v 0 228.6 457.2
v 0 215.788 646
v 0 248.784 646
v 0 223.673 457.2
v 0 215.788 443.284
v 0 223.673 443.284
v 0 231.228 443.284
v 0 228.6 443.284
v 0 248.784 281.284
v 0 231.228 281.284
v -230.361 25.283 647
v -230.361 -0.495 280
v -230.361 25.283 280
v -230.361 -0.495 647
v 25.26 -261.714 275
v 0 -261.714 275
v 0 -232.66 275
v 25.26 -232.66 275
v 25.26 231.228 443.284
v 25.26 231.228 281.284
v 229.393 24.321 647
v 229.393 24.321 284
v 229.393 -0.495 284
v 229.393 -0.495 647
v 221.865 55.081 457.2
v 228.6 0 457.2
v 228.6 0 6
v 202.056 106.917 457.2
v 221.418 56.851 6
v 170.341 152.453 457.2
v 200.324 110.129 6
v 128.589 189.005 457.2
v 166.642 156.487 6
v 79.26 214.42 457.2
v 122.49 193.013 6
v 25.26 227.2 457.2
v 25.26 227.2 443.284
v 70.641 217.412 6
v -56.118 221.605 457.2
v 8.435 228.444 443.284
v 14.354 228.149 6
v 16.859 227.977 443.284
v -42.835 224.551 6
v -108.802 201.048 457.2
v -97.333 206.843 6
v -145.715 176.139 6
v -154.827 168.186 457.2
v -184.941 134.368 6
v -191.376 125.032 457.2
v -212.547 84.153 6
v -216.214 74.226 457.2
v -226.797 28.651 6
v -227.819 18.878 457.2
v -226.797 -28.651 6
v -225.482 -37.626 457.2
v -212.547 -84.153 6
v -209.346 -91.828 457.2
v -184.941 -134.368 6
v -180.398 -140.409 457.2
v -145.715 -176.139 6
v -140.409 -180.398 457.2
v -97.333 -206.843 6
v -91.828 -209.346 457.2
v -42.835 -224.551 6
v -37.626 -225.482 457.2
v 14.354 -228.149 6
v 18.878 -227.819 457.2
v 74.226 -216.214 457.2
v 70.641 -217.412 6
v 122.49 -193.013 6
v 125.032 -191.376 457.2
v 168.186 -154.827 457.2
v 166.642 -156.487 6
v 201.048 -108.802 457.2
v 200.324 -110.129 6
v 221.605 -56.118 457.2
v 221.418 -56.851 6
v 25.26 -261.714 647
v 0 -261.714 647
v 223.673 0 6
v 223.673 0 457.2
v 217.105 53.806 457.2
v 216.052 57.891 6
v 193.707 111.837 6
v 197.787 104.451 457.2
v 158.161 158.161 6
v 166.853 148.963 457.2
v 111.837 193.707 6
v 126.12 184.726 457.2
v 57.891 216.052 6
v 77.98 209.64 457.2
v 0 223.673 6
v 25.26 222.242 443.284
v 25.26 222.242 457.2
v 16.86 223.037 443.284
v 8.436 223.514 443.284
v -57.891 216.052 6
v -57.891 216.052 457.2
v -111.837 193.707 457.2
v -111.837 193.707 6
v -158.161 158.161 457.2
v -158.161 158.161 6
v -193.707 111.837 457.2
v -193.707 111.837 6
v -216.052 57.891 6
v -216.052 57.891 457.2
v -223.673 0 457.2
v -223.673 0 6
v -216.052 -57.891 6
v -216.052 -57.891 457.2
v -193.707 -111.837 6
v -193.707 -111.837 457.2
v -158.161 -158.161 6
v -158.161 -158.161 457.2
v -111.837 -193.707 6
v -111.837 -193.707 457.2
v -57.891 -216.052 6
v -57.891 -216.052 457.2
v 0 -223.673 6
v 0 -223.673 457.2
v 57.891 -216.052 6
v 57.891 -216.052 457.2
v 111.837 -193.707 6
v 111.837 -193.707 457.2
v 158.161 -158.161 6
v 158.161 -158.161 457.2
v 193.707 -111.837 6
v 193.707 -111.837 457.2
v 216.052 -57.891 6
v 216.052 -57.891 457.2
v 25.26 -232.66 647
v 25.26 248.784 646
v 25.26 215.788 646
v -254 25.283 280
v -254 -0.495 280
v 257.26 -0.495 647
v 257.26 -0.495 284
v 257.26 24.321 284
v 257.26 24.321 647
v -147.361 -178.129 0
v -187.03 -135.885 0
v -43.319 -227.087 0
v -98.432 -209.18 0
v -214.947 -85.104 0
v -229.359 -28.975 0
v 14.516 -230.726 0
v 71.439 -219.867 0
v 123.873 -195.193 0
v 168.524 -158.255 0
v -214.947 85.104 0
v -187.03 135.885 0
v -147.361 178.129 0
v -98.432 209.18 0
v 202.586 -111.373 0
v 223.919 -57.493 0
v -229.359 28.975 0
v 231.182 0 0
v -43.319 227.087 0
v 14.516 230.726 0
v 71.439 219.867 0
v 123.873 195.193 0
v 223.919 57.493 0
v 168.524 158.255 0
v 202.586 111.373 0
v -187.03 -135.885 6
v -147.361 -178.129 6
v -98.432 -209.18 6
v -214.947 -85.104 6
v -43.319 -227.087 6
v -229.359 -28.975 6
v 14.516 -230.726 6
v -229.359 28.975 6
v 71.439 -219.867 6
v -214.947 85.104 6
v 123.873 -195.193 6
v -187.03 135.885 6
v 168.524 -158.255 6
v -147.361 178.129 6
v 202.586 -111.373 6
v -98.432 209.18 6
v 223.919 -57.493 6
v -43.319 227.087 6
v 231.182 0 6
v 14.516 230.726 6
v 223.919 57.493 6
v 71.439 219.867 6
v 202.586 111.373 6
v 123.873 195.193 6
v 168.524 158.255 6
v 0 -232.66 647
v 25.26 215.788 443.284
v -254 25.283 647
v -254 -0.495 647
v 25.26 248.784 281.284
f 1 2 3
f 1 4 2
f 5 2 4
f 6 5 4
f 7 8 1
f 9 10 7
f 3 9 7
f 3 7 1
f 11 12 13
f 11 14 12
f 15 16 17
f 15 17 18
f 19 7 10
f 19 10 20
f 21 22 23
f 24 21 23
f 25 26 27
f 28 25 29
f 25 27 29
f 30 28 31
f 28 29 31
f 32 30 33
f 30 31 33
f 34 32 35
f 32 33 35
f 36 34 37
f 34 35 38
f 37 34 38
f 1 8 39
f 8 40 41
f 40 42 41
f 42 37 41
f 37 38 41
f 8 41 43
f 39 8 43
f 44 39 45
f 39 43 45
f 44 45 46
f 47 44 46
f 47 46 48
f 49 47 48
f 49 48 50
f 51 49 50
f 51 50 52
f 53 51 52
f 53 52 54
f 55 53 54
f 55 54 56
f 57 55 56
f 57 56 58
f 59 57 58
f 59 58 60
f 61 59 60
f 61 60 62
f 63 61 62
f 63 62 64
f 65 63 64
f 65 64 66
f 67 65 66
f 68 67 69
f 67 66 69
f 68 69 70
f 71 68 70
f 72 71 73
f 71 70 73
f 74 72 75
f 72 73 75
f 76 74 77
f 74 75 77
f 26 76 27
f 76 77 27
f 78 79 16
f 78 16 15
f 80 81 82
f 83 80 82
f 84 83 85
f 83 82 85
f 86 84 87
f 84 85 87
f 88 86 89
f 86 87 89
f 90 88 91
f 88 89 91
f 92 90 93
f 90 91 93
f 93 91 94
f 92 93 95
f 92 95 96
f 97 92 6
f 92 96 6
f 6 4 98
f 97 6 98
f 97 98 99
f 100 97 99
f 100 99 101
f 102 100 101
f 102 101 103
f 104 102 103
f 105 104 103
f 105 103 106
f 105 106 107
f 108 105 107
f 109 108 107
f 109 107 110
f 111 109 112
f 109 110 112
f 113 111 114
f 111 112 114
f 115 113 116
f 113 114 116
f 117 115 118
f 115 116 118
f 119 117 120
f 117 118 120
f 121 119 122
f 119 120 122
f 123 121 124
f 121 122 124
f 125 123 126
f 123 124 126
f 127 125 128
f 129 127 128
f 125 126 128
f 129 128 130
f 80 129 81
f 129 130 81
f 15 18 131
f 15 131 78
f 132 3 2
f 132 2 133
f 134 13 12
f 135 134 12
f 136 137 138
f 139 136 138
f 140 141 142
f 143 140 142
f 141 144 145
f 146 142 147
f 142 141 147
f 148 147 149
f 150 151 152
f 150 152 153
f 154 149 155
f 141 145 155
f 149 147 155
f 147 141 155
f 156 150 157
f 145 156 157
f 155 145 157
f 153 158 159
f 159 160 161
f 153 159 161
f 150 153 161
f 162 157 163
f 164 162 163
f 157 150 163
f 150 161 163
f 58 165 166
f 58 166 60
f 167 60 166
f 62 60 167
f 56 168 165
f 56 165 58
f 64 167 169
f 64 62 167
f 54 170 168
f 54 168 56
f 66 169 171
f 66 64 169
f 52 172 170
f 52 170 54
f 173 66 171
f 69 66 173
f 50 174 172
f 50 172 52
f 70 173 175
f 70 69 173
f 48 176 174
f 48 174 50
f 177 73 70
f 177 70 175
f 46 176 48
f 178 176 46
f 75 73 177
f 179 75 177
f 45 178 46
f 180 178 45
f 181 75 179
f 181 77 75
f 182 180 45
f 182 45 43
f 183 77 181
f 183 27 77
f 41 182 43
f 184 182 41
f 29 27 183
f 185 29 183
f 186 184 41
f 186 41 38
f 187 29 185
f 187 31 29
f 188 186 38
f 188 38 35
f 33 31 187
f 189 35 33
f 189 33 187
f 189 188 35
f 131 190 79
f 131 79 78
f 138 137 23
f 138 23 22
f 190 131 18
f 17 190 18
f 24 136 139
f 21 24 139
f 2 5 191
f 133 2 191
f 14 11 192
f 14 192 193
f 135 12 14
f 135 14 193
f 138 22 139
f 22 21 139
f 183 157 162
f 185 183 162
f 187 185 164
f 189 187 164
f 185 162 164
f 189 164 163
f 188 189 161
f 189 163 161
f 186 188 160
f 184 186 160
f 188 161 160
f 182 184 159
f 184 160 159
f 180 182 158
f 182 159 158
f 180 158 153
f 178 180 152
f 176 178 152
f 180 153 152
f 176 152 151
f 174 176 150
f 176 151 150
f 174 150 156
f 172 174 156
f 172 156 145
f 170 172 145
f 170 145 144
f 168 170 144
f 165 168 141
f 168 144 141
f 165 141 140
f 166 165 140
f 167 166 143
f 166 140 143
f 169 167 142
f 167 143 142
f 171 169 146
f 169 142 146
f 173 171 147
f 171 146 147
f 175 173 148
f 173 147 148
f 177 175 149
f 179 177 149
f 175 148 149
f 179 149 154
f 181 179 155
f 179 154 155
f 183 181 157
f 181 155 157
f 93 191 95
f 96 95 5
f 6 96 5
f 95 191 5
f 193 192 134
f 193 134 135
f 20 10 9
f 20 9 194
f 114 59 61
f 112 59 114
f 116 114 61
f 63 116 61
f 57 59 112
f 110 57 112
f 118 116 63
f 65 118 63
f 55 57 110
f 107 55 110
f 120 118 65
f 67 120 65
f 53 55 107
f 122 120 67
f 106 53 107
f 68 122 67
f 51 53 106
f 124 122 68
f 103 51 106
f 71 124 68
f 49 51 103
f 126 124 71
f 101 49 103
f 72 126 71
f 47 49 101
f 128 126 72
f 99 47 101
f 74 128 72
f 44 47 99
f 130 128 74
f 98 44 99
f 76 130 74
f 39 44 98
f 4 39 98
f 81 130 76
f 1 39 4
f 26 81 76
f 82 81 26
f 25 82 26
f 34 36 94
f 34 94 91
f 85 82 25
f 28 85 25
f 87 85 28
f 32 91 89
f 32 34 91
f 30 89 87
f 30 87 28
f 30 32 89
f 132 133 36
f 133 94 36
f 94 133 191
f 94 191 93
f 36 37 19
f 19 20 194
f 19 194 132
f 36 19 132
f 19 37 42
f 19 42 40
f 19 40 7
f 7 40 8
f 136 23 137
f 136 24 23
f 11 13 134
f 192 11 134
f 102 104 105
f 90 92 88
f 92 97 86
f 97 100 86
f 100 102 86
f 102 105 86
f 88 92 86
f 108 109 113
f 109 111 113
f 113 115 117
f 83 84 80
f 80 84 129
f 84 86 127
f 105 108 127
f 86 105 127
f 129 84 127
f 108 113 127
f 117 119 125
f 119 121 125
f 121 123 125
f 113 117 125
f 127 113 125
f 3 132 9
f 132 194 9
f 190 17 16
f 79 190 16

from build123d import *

# Parameters (mm, degrees)
F0_R      = 228.6
F1_DEPTH  = 457.2
F2_R      = 223.673346771
F3_DEPTH  = 457.201
F4_R      = 231.1817516989
F5_DEPTH  = 6
F6_W      = 25.2598356456
F6_H      = 21.5632617474
F7_DEPTH  = 458
F8_W      = 25.2598356456
F8_H      = 20.7158460617
F9_DEPTH  = 35
F10_W     = 25.2598356456
F10_H     = 23.5666930676
F11_DEPTH = 464.001
F12_W     = 25.2598356456
F12_H     = 17.556566596
F13_DEPTH = 162
F14_W     = 25.2598356456
F14_H     = 16.4982843399
F15_DEPTH = 183
F16_DEPTH = 494
F17_W     = 25.2598356456
F17_H     = 29.0536686182
F18_DEPTH = 189
F20_DEPTH = 256.4425873445
F21_DEPTH = 25
F22_DEPTH = 223
F23_W     = 24.816502586
F23_H     = 183
F24_DEPTH = 232
F25_W     = 204.1333634406
F25_H     = 183
F26_DEPTH = 286.0359315554
F27_DEPTH = 180
F28_W     = 25.7785625309
F28_H     = 183
F29_DEPTH = 254
F30_W     = 255.6209247559
F30_H     = 183
F31_DEPTH = 249.2808553705
F32_DEPTH = 184
F33_DEPTH = 182


with BuildPart() as f1:
    # F0 (on Top) → F1 (new body)
    with BuildSketch(Plane.XY):
        Circle(F0_R)
    extrude(amount=F1_DEPTH)

    # F2 (on face) → F3 (cut, through all)
    with BuildSketch(Plane.XY.offset(457.2)):
        Circle(F2_R)
    extrude(amount=-F3_DEPTH, mode=Mode.SUBTRACT)

    # F4 (on Top) → F5 (join)
    with BuildSketch(Plane.XY):
        Circle(F4_R)
    extrude(amount=F5_DEPTH)

    # F6 (on face) → F7 (join)
    with BuildSketch(Plane.XY.offset(6)):
        with Locations((12.6299178228, 203.0028104782)):
            Rectangle(F6_W, F6_H)
    extrude(amount=F7_DEPTH)

    # F8 (on face) → F9 (join)
    with BuildSketch(Plane(origin=(0, 213.7844413519, 0), x_dir=(-1, 0, 0), z_dir=(0, 1, 0))):
        with Locations((-12.6299178228, 453.6420769691)):
            Rectangle(F8_W, F8_H)
    extrude(amount=F9_DEPTH)

    # F10 (on face) → F11 (cut, through all)
    with BuildSketch(Plane.XY.offset(464)):
        with Locations((12.6299178228, 204.0045261383)):
            Rectangle(F10_W, F10_H)
    extrude(amount=-F11_DEPTH, mode=Mode.SUBTRACT)

    # F12 (on face) → F13 (join)
    with BuildSketch(Plane(origin=(0, 0, 443.2841539383), x_dir=(1, 0, 0), z_dir=(0, 0, -1))):
        with Locations((12.6299178228, -240.0061580539)):
            Rectangle(F12_W, F12_H)
    extrude(amount=F13_DEPTH)

    # F14 (on face) → F15 (join)
    with BuildSketch(Plane.XY.offset(464)):
        with Locations((12.6299178228, 240.5352991819)):
            Rectangle(F14_W, F14_H)
    extrude(amount=F15_DEPTH)

    # F16 (add): a face of the model
    f16_faces = [f1.faces().sort_by_distance(p)[0] for p in [
        (12.6299178228, 232.286157012, 555.5),
    ]]
    extrude(f16_faces, amount=F16_DEPTH)

    # F17 (on face) → F18 (join)
    with BuildSketch(Plane(origin=(0, 0, 464), x_dir=(1, 0, 0), z_dir=(0, 0, -1))):
        with Locations((12.6299178228, 247.1870086789)):
            Rectangle(F17_W, F17_H)
    extrude(amount=F18_DEPTH)

    # F19 (on face) → F20 (cut, through all)
    with BuildSketch(Plane.YZ.offset(25.2598356456)):
        Polygon((-232.6601743698, 647), (-232.6601743698, 464), (215.7878726721, 464), (222.5045859814, 464), (222.5045859814, 647), align=None)
    extrude(amount=-F20_DEPTH, mode=Mode.SUBTRACT)

    # F21 (add): a face of the model
    f21_faces = [f1.faces().sort_by_distance(p)[0] for p in [
        (12.6299178228, 192.2211796045, 3),
    ]]
    extrude(f21_faces, amount=F21_DEPTH)

    # F22 (add): a face of the model
    f22_faces = [f1.faces().sort_by_distance(p)[0] for p in [
        (12.6299178228, 222.5045859814, 555.5),
    ]]
    extrude(f22_faces, amount=F22_DEPTH)

    # F23 (on face) → F24 (join)
    with BuildSketch(Plane.YZ.offset(25.2598356456)):
        with Locations((11.9128372744, 555.5)):
            Rectangle(F23_W, F23_H)
    extrude(amount=F24_DEPTH)

    # F25 (on face) → F26 (cut, through all)
    with BuildSketch(Plane(origin=(0, 24.3210885674, 0), x_dir=(-1, 0, 0), z_dir=(0, 1, 0))):
        with Locations((-127.3265173659, 555.5)):
            Rectangle(F25_W, F25_H)
    extrude(amount=-F26_DEPTH, mode=Mode.SUBTRACT)

    # F27 (add): a face of the model
    f27_faces = [f1.faces().sort_by_distance(p)[0] for p in [
        (243.3265173659, 11.9128372744, 464),
    ]]
    extrude(f27_faces, amount=F27_DEPTH)

    # F28 (on face) → F29 (join)
    with BuildSketch(Plane(origin=(0, 0, 0), x_dir=(0, -1, 0), z_dir=(-1, 0, 0))):
        with Locations((-12.3938672468, 555.5)):
            Rectangle(F28_W, F28_H)
    extrude(amount=F29_DEPTH)

    # F30 (on face) → F31 (cut, through all)
    with BuildSketch(Plane.XZ.offset(0.4954140186)):
        with Locations((-102.5506267324, 555.5)):
            Rectangle(F30_W, F30_H)
    extrude(amount=-F31_DEPTH, mode=Mode.SUBTRACT)

    # F32 (add): a face of the model
    f32_faces = [f1.faces().sort_by_distance(p)[0] for p in [
        (-242.1805445552, 12.3938672468, 464),
    ]]
    extrude(f32_faces, amount=F32_DEPTH)

    # F33 (add): a face of the model
    f33_faces = [f1.faces().sort_by_distance(p)[0] for p in [
        (12.6299178228, 232.286157012, 464),
    ]]
    extrude(f33_faces, amount=F33_DEPTH)


solid = f1.part
